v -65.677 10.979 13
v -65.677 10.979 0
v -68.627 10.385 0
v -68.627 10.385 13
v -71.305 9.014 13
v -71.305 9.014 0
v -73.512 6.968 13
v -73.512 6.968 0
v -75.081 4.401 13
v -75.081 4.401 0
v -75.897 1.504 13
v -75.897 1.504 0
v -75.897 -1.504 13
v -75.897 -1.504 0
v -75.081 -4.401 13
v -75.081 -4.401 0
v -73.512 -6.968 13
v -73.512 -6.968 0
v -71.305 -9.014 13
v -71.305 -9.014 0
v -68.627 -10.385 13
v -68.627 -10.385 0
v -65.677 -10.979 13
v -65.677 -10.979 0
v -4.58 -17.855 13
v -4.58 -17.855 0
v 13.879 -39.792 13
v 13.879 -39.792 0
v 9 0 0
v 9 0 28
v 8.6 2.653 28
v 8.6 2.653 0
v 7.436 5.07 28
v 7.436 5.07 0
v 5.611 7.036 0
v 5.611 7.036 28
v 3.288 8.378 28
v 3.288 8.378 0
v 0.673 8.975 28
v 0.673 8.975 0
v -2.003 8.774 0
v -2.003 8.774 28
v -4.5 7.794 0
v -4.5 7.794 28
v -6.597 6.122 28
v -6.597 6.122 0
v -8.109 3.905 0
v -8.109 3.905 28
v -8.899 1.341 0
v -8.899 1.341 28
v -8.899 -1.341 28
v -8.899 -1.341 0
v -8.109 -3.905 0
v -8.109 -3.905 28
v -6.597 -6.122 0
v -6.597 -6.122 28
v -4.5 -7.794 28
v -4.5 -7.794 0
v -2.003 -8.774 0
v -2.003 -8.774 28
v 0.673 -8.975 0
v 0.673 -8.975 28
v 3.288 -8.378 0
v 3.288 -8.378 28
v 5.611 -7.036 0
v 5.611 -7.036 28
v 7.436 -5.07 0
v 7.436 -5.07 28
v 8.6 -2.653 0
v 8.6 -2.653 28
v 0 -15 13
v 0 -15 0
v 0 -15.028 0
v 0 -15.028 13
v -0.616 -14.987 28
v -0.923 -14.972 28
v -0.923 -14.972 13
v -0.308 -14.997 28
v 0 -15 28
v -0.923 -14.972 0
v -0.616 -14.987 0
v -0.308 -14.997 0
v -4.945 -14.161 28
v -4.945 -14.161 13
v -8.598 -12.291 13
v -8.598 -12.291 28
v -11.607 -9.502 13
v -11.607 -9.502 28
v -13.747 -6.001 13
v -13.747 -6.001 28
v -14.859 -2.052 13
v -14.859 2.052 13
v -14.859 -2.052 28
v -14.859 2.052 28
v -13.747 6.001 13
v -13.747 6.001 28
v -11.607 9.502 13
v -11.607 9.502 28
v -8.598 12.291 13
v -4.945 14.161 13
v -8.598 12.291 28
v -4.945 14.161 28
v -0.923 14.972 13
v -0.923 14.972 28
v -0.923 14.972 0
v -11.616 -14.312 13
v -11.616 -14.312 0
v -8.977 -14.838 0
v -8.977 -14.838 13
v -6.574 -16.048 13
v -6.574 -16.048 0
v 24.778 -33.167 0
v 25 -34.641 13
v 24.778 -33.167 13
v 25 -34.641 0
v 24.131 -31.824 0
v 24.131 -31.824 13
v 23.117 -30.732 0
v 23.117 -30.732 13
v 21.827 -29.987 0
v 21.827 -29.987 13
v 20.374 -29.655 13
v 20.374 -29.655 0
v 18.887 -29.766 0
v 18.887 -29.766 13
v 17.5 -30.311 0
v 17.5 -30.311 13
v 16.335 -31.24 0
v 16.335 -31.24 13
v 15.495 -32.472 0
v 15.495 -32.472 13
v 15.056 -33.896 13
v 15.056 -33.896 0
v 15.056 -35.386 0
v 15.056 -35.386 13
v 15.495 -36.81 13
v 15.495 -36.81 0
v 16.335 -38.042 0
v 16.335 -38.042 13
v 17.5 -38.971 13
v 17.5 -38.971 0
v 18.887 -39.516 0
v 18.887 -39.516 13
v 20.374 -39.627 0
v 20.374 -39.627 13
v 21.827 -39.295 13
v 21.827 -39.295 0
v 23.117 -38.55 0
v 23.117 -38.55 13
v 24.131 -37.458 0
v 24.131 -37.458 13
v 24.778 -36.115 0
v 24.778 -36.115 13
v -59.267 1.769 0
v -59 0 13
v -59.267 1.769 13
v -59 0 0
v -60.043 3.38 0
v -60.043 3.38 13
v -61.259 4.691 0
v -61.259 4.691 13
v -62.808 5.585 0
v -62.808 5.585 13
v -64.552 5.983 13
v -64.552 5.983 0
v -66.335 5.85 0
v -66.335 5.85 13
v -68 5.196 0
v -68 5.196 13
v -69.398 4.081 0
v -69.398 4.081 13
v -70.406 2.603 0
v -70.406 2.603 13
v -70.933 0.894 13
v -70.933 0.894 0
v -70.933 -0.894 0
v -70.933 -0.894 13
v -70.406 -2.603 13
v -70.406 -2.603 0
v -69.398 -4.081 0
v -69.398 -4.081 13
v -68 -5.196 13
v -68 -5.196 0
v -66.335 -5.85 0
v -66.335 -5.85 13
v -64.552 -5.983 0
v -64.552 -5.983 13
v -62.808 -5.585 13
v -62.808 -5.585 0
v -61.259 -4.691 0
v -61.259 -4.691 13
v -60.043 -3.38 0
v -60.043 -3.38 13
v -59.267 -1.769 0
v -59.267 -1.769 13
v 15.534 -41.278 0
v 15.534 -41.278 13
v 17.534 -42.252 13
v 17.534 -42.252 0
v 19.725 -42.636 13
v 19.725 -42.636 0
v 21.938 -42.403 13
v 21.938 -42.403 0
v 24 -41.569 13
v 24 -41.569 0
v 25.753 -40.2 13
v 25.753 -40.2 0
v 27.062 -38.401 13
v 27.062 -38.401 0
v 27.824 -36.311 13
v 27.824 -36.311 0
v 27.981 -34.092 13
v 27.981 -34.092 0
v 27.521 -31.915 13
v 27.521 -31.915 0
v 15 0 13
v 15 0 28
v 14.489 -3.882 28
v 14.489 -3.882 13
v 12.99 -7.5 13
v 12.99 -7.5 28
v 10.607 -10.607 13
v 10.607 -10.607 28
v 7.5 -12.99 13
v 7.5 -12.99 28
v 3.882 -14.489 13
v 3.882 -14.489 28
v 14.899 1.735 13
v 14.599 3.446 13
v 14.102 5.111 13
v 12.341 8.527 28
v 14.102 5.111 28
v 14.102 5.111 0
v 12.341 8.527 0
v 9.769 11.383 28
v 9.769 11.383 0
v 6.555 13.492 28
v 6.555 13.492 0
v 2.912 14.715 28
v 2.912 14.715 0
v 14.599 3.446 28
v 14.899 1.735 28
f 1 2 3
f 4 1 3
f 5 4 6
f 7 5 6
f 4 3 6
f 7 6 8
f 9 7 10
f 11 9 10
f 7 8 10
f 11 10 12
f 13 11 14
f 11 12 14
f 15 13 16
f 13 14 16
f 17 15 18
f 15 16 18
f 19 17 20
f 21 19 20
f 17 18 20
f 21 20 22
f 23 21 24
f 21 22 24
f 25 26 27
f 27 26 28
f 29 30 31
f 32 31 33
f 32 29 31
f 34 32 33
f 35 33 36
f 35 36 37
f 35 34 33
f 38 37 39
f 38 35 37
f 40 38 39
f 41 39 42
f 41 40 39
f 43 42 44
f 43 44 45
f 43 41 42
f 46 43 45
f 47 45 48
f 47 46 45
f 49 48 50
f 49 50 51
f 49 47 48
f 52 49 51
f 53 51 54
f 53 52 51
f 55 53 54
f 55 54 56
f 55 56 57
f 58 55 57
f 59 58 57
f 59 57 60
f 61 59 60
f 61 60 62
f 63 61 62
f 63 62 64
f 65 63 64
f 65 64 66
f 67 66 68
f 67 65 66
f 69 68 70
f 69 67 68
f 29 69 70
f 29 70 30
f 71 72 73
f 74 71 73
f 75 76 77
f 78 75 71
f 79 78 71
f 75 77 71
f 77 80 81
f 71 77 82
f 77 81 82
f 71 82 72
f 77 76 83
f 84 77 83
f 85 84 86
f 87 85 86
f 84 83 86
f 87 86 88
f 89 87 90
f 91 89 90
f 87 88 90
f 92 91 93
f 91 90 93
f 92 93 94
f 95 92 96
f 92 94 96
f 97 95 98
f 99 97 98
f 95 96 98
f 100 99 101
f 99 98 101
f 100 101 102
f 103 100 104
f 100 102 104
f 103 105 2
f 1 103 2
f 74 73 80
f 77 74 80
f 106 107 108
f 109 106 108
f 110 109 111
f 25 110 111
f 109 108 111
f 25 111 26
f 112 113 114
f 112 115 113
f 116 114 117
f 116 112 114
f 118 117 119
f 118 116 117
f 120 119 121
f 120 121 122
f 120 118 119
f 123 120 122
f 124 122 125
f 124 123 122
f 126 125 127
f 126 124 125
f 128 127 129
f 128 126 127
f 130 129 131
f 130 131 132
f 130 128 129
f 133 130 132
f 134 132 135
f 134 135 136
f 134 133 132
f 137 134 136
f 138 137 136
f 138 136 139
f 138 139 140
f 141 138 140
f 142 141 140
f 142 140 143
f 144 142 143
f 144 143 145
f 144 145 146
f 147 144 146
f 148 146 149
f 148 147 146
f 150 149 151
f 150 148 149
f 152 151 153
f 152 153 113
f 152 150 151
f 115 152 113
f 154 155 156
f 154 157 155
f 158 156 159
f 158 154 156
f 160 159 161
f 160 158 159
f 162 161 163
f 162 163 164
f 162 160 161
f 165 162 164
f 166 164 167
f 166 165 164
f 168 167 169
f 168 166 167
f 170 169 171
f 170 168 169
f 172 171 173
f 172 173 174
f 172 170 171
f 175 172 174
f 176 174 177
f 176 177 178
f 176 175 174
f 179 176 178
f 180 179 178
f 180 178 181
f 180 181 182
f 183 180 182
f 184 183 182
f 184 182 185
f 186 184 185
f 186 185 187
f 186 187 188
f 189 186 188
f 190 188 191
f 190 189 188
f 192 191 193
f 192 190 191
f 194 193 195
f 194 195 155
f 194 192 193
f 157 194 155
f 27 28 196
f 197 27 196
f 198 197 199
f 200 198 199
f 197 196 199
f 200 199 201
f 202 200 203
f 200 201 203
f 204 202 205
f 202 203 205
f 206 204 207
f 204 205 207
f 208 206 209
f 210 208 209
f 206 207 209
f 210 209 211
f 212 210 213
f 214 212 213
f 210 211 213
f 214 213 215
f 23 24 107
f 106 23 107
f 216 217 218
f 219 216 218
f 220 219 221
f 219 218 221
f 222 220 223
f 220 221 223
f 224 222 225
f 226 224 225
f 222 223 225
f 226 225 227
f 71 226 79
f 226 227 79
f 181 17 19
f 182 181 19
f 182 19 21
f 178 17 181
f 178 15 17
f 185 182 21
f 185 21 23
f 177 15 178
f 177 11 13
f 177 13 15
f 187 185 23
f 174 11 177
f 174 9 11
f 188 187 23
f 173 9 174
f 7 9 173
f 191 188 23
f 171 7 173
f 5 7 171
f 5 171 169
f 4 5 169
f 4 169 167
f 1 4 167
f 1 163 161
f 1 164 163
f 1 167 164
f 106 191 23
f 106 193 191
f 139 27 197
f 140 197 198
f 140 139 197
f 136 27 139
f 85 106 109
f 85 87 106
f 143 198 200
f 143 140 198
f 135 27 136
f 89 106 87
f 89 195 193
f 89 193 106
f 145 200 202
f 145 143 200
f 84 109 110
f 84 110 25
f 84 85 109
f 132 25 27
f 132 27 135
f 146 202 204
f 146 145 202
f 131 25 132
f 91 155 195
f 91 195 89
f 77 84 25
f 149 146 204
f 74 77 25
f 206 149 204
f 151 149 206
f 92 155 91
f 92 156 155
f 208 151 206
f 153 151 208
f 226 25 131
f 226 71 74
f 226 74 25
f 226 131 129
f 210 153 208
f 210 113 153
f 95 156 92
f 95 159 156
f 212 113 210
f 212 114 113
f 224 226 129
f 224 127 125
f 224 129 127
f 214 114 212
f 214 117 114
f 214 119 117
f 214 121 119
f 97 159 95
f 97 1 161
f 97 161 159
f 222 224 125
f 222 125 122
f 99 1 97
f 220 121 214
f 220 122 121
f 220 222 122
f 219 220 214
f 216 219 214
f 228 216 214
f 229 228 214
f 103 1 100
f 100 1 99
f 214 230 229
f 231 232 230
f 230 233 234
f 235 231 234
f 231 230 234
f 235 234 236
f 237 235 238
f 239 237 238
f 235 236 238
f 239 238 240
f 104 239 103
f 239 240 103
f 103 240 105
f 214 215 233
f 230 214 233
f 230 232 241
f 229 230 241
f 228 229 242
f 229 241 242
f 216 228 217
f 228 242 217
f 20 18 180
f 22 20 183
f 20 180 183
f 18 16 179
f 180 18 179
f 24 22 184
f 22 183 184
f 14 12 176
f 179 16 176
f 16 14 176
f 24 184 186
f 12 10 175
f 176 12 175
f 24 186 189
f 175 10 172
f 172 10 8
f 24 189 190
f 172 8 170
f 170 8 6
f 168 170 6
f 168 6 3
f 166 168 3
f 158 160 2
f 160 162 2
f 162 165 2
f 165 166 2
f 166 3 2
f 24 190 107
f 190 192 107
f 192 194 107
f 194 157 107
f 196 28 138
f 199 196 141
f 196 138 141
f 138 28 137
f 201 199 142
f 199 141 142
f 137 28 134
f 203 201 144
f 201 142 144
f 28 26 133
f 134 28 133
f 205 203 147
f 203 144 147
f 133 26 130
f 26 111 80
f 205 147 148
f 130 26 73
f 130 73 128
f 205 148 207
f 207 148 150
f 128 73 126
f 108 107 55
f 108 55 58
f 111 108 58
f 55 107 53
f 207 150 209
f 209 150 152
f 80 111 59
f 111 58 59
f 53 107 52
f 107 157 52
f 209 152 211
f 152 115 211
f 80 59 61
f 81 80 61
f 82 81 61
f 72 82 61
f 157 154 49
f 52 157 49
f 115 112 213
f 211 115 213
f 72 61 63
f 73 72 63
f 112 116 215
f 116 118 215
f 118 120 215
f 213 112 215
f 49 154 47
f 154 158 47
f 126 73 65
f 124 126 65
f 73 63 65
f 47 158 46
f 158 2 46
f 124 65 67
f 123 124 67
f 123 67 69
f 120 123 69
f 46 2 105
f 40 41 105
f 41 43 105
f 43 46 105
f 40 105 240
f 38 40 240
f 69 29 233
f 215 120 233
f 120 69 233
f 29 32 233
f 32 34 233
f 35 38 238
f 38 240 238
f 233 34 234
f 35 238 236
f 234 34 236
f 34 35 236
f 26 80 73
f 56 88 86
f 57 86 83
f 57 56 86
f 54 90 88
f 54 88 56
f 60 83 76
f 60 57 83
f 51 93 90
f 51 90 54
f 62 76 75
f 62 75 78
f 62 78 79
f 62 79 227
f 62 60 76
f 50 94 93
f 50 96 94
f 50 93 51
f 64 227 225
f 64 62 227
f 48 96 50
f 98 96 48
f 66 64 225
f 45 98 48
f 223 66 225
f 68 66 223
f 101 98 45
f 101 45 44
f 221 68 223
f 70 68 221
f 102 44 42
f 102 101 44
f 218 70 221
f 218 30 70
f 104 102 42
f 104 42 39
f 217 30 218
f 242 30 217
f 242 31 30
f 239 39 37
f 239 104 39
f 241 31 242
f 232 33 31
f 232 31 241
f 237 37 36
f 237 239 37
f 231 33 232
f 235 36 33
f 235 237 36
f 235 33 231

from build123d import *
from build123d import SkipClean  # not in build123d's __all__

# Parameters (mm, degrees)
F0_R     = 5
F0_R_2   = 6
F0_R_3   = 9
F1_DEPTH = 28
F2_R     = 5
F2_R_2   = 6
F3_DEPTH = 10
F4_DEPTH = 25


with BuildPart() as f1:
    # F0 (on Top) → F1 (new body)
    with BuildSketch(Plane.XY):
        with BuildLine():
            ThreePointArc((14.102419126, 5.1109465654), (14.7739007525, 2.5945821542), (15, 0))
            ThreePointArc((15, 0), (10.6066017178, -10.6066017178), (0, -15))
            Line((0, -15), (0, -15.0284832917))
            Line((0, -15.0284832917), (-0.9230769231, -14.9715706923))
            ThreePointArc((-0.9230769231, -14.9715706923), (-15, 3.22e-08), (-0.9230768589, 14.9715706962))
            Line((-0.9230768589, 14.9715706962), (-65.6769230769, 10.979151841))
            ThreePointArc((-65.6769230769, 10.979151841), (-76, 0), (-65.6769230769, -10.979151841))
            Line((-65.6769230769, -10.979151841), (-11.6160346835, -14.3122930019))
            ThreePointArc((-11.6160346835, -14.3122930019), (-7.7343733546, -15.3615666346), (-4.5798065483, -17.8549535065))
            Line((-4.5798065483, -17.8549535065), (13.8787097995, -39.7917254502))
            ThreePointArc((13.8787097995, -39.7917254502), (24, -41.5692193817), (27.5212902005, -31.9151779832))
            Line((27.5212902005, -31.9151779832), (14.102419126, 5.1109465654))
        make_face()
        with Locations((20, -34.6410161514)):
            Circle(F0_R, mode=Mode.SUBTRACT)
        with Locations((-65, 0)):
            Circle(F0_R_2, mode=Mode.SUBTRACT)
        with BuildLine():
            ThreePointArc((0, -15), (10.6066017178, -10.6066017178), (15, 0))
            ThreePointArc((15, 0), (14.7739007525, 2.5945821542), (14.102419126, 5.1109465654))
            ThreePointArc((14.102419126, 5.1109465654), (8.2299296905, 12.5406641486), (-0.9230768589, 14.9715706962))
            ThreePointArc((-0.9230768589, 14.9715706962), (-15, 3.22e-08), (-0.9230769231, -14.9715706923))
            ThreePointArc((-0.9230769231, -14.9715706923), (-0.4617573041, -14.9928909885), (0, -15))
        make_face()
        Circle(F0_R_3, mode=Mode.SUBTRACT)
    extrude(amount=F1_DEPTH)

    # F2 (on face) → F3 (join)
    with BuildSketch(Plane.XY.offset(28)):
        with BuildLine():
            ThreePointArc((14.102419126, 5.1109465654), (14.7739007525, 2.5945821542), (15, 0))
            ThreePointArc((15, 0), (10.6066017178, -10.6066017178), (0, -15))
            Line((0, -15), (0, -15.0284832917))
            Line((0, -15.0284832917), (-0.9230769231, -14.9715706923))
            ThreePointArc((-0.9230769231, -14.9715706923), (-15, 3.22e-08), (-0.9230768589, 14.9715706962))
            Line((-0.9230768589, 14.9715706962), (-65.6769230769, 10.979151841))
            ThreePointArc((-65.6769230769, 10.979151841), (-76, 0), (-65.6769230769, -10.979151841))
            Line((-65.6769230769, -10.979151841), (-11.6160346835, -14.3122930019))
            ThreePointArc((-11.6160346835, -14.3122930019), (-7.7343733546, -15.3615666346), (-4.5798065483, -17.8549535065))
            Line((-4.5798065483, -17.8549535065), (13.8787097995, -39.7917254502))
            ThreePointArc((13.8787097995, -39.7917254502), (24, -41.5692193817), (27.5212902005, -31.9151779832))
            Line((27.5212902005, -31.9151779832), (14.102419126, 5.1109465654))
        make_face()
        with Locations((20, -34.6410161514)):
            Circle(F2_R, mode=Mode.SUBTRACT)
        with Locations((-65, 0)):
            Circle(F2_R_2, mode=Mode.SUBTRACT)
    extrude(amount=F3_DEPTH)

    # F4 (cut): a face of the model
    f4_faces = [f1.faces().sort_by_distance(p)[0] for p in [
        (-23.7772133401, -6.7537112781, 38),
    ]]
    with SkipClean():  # cleaning this boolean's faces spoils the solid; the shape is the same uncleaned
        extrude(f4_faces, amount=-F4_DEPTH, mode=Mode.SUBTRACT)


solid = f1.part
